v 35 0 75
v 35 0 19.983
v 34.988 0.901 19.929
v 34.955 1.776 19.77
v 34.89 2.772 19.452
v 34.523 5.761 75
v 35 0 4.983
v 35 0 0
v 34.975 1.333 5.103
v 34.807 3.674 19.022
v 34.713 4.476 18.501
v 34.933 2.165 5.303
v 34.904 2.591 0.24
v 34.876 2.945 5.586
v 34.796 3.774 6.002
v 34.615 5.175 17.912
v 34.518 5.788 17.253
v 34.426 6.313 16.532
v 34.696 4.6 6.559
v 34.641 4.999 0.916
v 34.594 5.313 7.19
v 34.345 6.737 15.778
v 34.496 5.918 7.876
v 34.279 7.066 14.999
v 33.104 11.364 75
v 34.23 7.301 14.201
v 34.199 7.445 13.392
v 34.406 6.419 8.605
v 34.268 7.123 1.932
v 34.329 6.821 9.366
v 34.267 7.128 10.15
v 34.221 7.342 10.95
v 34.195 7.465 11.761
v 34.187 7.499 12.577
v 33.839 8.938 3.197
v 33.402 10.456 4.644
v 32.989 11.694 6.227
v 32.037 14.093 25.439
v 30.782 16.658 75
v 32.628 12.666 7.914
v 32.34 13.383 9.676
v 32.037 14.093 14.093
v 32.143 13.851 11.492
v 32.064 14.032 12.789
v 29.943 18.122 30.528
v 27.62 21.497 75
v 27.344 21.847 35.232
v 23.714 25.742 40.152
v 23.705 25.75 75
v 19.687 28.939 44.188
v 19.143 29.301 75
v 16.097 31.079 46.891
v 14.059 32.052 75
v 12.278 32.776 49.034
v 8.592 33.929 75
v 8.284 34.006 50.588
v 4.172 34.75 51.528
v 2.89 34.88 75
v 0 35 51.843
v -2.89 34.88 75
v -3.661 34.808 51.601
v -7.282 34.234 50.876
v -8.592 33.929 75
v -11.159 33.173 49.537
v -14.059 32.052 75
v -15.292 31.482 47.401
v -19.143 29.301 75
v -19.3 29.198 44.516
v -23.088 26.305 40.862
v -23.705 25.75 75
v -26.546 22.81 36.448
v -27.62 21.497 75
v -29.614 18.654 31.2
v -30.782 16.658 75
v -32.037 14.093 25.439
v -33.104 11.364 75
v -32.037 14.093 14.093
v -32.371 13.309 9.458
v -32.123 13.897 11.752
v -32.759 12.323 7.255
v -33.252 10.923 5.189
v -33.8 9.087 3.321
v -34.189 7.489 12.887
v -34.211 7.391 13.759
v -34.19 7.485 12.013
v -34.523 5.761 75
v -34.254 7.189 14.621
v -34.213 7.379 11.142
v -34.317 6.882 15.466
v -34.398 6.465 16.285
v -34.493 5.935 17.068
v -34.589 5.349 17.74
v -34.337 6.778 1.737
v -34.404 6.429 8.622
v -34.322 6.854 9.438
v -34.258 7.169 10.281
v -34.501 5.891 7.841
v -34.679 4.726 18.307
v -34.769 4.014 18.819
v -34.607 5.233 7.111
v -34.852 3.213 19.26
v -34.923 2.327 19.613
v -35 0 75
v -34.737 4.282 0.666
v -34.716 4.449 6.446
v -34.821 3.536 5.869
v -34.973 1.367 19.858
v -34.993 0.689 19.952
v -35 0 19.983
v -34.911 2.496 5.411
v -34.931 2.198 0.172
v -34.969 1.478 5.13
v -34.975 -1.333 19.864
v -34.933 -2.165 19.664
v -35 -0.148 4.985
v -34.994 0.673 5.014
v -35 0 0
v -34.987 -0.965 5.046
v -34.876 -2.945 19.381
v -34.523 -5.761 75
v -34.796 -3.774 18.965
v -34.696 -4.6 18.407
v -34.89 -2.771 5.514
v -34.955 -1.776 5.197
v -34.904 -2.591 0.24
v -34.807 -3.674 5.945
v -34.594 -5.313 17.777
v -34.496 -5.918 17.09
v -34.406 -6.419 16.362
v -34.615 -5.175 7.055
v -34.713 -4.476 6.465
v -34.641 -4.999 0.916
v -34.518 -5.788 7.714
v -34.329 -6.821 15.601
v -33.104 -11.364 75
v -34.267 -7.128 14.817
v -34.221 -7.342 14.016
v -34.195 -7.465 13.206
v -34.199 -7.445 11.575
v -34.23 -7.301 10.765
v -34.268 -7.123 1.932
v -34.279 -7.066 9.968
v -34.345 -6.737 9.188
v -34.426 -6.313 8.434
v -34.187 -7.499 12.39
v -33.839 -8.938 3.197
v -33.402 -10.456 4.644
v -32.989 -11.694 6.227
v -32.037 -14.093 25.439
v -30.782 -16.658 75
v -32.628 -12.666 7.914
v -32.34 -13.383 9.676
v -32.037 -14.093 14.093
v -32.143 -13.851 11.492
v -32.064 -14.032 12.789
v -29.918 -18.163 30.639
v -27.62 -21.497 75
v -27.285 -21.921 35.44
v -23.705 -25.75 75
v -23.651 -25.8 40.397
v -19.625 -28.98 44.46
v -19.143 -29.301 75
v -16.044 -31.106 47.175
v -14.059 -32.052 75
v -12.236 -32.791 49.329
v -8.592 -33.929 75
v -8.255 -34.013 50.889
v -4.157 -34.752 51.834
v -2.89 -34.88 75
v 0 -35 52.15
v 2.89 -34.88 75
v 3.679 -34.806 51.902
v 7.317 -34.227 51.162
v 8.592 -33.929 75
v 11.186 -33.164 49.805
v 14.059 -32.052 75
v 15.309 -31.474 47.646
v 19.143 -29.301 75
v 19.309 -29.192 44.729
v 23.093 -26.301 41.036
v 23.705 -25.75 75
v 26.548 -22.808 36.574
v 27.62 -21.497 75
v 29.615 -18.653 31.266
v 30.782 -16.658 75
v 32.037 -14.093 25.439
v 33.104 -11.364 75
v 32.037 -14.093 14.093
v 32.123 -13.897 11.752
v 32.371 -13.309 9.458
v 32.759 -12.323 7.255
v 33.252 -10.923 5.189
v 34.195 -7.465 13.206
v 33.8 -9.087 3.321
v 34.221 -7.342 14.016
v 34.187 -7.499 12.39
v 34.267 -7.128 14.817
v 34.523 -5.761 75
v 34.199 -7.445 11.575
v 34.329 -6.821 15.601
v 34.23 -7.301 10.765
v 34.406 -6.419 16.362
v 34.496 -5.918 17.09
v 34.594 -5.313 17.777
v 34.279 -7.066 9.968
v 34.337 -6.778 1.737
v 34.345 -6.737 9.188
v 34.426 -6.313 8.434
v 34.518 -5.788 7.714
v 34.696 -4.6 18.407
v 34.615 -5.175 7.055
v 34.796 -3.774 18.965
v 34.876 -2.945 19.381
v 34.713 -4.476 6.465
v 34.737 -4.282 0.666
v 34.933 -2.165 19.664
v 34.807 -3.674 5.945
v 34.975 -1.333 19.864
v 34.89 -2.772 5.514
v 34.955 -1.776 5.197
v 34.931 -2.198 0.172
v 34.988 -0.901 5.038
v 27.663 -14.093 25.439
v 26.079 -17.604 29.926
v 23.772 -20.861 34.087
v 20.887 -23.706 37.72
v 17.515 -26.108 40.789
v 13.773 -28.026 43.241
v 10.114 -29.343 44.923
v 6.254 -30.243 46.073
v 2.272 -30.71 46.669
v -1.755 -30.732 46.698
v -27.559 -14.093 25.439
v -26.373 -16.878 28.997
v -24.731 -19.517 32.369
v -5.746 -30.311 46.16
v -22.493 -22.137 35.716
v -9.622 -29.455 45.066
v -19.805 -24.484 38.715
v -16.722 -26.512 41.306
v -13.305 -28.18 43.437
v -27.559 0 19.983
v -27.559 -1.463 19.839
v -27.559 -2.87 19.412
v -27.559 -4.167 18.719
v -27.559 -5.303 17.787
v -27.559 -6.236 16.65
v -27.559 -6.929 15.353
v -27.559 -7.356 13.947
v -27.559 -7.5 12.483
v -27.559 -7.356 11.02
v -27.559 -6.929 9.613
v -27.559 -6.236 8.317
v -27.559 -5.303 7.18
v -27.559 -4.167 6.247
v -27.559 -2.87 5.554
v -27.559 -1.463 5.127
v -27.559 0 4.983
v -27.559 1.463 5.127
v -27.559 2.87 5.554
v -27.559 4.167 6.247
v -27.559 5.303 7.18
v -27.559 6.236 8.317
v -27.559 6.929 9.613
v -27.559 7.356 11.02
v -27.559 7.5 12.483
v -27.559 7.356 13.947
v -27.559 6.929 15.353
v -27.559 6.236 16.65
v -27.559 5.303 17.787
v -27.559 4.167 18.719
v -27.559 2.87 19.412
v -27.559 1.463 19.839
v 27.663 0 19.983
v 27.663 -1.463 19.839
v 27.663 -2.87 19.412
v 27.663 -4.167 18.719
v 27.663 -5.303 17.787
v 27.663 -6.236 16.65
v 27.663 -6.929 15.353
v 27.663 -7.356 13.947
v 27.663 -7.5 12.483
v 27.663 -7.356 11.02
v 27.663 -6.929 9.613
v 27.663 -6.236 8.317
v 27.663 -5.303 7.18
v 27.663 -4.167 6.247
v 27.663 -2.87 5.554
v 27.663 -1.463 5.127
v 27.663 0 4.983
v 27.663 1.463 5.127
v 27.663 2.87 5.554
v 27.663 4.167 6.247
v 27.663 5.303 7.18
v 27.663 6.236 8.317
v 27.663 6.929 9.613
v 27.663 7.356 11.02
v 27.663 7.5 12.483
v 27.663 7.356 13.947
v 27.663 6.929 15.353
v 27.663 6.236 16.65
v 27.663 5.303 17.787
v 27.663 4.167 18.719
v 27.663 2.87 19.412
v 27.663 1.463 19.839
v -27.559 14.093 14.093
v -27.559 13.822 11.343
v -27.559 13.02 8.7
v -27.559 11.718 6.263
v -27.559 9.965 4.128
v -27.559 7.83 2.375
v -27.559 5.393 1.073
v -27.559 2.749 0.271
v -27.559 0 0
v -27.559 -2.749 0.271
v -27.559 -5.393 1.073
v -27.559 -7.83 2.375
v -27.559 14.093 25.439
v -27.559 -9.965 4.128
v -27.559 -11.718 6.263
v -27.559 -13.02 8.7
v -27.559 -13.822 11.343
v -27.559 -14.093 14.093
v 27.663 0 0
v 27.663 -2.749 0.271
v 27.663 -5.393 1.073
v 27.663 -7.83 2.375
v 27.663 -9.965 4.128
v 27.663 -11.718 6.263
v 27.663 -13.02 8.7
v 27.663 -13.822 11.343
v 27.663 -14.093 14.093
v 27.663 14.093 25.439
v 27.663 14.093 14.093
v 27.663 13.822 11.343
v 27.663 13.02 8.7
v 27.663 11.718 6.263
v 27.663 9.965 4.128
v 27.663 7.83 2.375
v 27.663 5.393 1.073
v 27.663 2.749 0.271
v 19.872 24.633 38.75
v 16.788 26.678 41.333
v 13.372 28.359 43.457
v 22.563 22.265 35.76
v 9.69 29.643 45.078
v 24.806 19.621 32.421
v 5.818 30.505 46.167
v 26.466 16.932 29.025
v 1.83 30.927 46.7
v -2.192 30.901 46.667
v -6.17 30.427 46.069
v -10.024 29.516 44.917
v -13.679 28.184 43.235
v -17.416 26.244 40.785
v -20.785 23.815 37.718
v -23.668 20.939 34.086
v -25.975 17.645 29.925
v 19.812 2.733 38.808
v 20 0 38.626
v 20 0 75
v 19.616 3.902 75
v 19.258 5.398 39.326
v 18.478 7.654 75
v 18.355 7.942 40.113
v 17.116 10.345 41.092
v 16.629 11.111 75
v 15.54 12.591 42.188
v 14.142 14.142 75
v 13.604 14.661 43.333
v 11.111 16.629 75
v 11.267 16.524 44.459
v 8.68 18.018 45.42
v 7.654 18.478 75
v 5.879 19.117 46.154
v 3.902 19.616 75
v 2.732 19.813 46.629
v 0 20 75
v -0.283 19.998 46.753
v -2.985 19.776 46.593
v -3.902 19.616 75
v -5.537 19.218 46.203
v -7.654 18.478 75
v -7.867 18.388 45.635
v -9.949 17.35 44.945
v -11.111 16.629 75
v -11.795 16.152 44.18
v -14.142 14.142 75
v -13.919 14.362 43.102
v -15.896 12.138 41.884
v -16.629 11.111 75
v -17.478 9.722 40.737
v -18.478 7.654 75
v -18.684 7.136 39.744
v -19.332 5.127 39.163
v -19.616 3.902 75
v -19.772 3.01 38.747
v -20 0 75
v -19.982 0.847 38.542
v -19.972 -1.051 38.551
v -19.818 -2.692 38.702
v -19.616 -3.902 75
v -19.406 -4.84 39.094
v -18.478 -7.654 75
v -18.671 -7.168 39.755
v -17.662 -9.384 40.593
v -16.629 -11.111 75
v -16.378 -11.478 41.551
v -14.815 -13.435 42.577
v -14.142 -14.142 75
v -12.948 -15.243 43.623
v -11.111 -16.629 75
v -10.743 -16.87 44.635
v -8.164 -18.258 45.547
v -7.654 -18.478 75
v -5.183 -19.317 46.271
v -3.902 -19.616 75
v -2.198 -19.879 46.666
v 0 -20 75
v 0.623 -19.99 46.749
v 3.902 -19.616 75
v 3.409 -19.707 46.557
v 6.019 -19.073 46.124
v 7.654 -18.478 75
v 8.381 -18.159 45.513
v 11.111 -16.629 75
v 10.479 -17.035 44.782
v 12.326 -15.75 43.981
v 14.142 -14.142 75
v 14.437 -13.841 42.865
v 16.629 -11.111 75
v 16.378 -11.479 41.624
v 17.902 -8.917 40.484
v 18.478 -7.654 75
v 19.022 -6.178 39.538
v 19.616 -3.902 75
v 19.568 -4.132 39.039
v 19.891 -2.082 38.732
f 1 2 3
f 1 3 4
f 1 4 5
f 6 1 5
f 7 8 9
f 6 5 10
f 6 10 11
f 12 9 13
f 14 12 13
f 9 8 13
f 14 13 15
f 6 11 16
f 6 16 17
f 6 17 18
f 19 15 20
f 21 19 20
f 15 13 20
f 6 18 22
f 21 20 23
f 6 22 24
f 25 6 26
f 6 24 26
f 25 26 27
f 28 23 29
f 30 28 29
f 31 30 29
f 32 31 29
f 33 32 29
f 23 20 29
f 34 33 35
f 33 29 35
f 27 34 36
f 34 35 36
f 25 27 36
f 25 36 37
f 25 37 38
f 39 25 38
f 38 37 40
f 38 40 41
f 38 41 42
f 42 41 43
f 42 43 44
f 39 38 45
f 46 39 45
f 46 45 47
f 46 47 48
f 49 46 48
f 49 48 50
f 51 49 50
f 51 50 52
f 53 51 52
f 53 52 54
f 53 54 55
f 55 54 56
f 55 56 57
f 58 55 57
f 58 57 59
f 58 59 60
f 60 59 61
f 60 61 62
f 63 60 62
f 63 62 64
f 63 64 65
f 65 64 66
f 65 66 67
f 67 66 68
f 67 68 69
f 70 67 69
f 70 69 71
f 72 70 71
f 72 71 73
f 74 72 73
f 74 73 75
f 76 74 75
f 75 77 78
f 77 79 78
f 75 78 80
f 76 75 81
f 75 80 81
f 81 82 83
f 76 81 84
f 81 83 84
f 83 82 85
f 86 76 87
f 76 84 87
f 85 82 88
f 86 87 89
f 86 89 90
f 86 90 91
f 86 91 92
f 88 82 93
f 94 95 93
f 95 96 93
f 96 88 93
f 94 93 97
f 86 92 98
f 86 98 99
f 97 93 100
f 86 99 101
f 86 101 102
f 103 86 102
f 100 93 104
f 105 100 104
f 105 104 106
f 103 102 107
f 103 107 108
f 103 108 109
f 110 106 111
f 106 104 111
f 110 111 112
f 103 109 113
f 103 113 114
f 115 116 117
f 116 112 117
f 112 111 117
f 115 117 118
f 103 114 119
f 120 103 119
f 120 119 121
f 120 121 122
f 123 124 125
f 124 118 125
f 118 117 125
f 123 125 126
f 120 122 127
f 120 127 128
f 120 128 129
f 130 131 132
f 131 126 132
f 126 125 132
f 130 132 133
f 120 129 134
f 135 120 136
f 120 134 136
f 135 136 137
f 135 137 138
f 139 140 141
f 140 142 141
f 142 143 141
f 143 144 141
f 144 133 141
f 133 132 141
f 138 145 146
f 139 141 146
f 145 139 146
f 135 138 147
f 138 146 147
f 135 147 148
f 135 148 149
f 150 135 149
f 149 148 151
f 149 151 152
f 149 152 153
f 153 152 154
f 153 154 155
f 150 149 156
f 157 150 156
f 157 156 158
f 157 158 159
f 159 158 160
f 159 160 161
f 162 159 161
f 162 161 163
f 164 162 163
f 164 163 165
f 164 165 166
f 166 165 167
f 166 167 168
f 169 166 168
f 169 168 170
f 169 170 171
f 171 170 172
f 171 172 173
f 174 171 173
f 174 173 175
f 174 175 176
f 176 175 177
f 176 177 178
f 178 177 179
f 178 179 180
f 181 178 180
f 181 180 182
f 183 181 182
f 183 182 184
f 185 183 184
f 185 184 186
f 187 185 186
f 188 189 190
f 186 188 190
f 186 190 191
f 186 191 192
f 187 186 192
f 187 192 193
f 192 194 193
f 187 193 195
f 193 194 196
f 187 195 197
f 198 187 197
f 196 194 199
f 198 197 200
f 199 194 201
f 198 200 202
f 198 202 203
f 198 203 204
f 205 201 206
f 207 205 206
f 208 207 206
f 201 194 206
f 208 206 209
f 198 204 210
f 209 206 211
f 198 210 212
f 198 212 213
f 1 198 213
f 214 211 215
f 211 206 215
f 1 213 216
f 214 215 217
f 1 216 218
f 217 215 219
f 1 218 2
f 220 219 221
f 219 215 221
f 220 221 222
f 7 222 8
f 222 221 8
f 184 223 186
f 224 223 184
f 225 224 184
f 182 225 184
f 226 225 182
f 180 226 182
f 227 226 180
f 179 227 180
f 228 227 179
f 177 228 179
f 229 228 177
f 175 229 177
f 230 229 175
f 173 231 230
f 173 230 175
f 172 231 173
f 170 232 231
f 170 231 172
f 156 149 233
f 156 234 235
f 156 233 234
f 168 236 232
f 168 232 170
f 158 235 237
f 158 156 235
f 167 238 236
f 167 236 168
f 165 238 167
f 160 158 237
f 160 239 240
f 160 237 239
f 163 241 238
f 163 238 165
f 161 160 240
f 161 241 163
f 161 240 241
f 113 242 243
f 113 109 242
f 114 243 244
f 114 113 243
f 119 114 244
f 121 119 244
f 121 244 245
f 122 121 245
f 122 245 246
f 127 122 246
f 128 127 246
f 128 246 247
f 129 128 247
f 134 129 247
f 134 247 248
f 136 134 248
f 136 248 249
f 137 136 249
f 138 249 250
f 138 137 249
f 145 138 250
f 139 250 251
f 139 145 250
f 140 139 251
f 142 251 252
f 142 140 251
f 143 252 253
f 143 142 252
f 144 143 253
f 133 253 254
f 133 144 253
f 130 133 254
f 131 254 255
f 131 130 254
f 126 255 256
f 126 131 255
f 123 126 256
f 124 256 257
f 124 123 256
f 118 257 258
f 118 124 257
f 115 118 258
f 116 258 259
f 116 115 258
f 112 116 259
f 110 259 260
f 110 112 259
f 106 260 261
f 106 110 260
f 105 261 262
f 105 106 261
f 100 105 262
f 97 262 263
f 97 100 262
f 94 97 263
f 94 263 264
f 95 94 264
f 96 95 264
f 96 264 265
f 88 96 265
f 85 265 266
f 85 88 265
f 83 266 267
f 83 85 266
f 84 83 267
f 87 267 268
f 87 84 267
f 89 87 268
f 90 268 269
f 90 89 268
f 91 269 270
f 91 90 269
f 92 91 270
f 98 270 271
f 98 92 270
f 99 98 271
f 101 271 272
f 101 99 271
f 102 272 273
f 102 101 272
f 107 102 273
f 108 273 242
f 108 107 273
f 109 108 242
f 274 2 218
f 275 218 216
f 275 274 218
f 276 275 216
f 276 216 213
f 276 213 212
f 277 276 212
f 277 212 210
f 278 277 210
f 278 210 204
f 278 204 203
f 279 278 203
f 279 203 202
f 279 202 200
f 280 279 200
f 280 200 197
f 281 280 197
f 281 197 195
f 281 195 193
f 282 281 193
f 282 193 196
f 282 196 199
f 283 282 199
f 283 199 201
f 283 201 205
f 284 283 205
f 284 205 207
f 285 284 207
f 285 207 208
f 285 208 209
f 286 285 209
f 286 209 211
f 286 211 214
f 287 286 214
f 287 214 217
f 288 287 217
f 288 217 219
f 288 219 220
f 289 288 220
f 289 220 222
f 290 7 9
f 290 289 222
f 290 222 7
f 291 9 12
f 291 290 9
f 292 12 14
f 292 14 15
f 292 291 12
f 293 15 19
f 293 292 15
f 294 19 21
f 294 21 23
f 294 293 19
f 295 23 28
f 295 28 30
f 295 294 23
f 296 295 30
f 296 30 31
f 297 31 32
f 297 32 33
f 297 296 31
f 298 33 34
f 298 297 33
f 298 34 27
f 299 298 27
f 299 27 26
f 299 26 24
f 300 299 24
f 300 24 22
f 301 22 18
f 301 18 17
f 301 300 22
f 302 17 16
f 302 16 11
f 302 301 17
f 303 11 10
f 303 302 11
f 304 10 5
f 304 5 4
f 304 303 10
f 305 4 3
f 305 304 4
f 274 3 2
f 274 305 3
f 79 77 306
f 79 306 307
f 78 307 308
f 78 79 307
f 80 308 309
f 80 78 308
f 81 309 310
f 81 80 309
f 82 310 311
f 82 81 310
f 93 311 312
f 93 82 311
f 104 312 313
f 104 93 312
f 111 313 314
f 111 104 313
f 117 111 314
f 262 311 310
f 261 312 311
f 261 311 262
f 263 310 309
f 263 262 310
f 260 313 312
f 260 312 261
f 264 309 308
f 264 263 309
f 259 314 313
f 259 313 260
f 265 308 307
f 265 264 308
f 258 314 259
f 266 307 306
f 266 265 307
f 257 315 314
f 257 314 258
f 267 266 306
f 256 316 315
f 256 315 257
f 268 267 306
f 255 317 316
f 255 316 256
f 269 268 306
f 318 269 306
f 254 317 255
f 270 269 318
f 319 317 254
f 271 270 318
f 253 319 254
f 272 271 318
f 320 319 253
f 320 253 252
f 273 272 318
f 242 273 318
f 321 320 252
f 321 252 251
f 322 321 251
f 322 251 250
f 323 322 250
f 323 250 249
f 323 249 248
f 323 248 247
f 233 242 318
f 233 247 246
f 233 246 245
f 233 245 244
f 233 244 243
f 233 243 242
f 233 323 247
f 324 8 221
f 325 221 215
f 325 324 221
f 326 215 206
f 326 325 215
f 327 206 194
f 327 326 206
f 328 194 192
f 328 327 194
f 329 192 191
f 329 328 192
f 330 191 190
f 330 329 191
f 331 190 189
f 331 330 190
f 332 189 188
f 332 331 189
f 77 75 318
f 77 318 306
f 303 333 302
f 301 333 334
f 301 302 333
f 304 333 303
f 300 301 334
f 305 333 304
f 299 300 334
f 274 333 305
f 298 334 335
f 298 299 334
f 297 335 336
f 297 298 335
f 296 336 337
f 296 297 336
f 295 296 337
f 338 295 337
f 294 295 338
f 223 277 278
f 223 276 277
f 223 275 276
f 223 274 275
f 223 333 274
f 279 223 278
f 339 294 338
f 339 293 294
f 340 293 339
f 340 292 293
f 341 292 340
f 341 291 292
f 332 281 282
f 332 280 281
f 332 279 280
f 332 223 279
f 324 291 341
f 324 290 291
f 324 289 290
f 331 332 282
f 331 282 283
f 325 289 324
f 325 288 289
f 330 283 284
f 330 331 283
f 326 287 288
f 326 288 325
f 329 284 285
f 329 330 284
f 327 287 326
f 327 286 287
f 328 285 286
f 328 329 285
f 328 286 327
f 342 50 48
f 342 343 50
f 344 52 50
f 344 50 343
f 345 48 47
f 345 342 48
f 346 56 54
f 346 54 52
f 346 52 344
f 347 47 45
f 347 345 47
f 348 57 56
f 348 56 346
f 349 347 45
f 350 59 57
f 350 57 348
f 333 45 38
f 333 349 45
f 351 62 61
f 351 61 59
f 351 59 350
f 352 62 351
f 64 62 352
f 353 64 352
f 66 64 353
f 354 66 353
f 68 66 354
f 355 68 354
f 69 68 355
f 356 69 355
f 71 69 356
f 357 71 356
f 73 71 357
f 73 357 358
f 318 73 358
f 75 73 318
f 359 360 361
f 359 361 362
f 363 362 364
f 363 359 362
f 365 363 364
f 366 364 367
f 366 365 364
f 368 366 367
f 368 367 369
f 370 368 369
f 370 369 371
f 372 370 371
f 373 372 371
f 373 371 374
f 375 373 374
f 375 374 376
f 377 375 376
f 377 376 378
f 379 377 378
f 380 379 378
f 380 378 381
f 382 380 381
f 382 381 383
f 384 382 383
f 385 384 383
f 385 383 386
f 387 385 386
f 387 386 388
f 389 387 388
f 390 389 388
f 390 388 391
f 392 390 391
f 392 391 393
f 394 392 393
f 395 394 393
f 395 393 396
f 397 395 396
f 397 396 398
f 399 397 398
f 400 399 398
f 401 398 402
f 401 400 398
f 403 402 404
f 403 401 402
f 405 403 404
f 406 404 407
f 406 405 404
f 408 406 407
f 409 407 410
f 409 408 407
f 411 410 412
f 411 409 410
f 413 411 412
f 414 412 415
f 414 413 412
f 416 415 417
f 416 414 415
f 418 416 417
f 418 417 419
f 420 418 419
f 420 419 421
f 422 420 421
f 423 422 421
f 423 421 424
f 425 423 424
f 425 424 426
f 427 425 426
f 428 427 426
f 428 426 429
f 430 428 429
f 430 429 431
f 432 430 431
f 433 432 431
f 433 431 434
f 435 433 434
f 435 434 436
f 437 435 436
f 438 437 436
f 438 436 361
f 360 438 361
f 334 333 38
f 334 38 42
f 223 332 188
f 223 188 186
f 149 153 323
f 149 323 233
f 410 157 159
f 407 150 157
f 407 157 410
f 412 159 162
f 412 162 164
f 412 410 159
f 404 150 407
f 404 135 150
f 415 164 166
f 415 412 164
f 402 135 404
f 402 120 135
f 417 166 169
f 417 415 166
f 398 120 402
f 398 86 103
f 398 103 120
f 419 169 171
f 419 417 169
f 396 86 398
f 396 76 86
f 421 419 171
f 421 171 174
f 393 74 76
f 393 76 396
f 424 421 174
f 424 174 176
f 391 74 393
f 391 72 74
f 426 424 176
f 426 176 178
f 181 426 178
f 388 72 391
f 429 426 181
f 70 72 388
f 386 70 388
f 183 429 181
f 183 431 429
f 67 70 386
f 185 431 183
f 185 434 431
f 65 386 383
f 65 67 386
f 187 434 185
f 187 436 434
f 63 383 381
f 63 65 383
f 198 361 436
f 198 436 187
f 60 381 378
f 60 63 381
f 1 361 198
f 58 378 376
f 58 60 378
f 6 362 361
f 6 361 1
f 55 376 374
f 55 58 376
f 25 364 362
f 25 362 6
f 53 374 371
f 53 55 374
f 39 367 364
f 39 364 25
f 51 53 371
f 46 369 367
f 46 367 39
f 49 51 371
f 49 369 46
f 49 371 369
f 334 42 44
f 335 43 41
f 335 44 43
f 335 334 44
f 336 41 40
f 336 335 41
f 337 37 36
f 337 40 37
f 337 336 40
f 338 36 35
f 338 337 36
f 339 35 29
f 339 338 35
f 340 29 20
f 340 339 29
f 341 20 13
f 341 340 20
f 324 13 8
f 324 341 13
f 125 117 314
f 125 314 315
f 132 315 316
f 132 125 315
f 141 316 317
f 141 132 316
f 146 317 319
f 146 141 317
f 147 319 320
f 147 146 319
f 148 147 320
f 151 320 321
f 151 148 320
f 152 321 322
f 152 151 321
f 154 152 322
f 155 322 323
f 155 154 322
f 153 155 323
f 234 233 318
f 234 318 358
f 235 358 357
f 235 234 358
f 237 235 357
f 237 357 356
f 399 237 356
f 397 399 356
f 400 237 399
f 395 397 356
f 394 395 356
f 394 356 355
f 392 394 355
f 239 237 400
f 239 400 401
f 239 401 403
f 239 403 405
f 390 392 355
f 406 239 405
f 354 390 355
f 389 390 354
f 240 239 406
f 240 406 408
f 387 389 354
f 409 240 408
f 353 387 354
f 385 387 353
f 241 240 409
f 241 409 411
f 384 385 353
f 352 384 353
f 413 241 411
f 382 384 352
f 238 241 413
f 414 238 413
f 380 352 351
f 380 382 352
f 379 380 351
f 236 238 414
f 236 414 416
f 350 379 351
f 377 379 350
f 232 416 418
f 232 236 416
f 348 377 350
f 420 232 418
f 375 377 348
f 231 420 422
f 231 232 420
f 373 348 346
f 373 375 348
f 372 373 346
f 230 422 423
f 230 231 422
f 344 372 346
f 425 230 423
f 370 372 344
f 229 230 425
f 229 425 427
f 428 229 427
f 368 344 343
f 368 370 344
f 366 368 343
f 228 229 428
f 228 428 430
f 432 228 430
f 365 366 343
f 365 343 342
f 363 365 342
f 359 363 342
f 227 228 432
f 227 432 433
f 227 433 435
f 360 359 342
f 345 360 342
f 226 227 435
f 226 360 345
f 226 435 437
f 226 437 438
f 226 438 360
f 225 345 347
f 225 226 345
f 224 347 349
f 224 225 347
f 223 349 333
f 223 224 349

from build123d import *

# Parameters (mm, degrees)
SKETCH1_R               = 35
SKETCH1_R_2             = 20
BOSS_EXTRUDE1_DEPTH     = 75
CUT_EXTRUDE1_DEPTH      = 45
CUT_EXTRUDE1_DEPTH_BACK = 54
CUT_EXTRUDE2_DEPTH      = 48
CUT_EXTRUDE2_DEPTH_BACK = 44
CUT_EXTRUDE3_DEPTH      = 44
CUT_EXTRUDE3_DEPTH_BACK = 44
SKETCH4_R               = 7.5


with BuildPart() as part:
    # Sketch1 → Boss-Extrude1 (new body)
    with BuildSketch(Plane.XY):
        Circle(SKETCH1_R)
        Circle(SKETCH1_R_2, mode=Mode.SUBTRACT)
    extrude(amount=BOSS_EXTRUDE1_DEPTH)

    # Sketch2 → Cut-Extrude1 (cut, two sides: drawn at the far end of the back side and taken through both)
    with BuildSketch(Plane(origin=(0, 0, 0), x_dir=(0, 0, -1), z_dir=(1, 0, 0)).offset(-CUT_EXTRUDE1_DEPTH_BACK)):
        with BuildLine():
            Line((0, -35), (0, 0))
            ThreePointArc((0, 0), (-4.127707746, -9.965168023), (-14.092875769, -14.092875769))
            Line((-14.092875769, -14.092875769), (-25.439318665, -14.092875769))
            Line((-25.439318665, -14.092875769), (-52.150222161, -35))
            Line((-52.150222161, -35), (0, -35))
        make_face()
        with BuildLine():
            Line((-25.439318665, 14.092875769), (-14.092875769, 14.092875769))
            ThreePointArc((-14.092875769, 14.092875769), (-4.127707746, 9.965168023), (0, 0))
            Line((0, 0), (0, 35))
            Line((0, 35), (-51.84345844, 35))
            Line((-51.84345844, 35), (-25.439318665, 14.092875769))
        make_face()
    extrude(amount=CUT_EXTRUDE1_DEPTH + CUT_EXTRUDE1_DEPTH_BACK, mode=Mode.SUBTRACT)

    # Sketch3 → Cut-Extrude2 (cut, two sides: drawn at the far end of the back side and taken through both)
    with BuildSketch(Plane(origin=(0, 0, 0), x_dir=(1, 0, 0), z_dir=(0, 1, 0)).offset(-CUT_EXTRUDE2_DEPTH_BACK)):
        with BuildLine():
            Line((-27.558791769, 0), (-27.558791769, -25.439318665))
            ThreePointArc((-27.558791769, -25.439318665), (0.052095226, -46.7551788), (27.662982221, -25.439318665))
            Line((27.662982221, -25.439318665), (27.662982221, 0))
            Line((27.662982221, 0), (-27.558791769, 0))
        make_face()
    extrude(amount=CUT_EXTRUDE2_DEPTH + CUT_EXTRUDE2_DEPTH_BACK, mode=Mode.SUBTRACT)

    # Sketch4 → Cut-Extrude3 (cut, two sides: drawn at the far end of the back side and taken through both)
    with BuildSketch(Plane(origin=(0, 0, 0), x_dir=(0, 0, -1), z_dir=(1, 0, 0)).offset(-CUT_EXTRUDE3_DEPTH_BACK)):
        with Locations(Location((-12.483344887, 0, 0), (0, 0, 180))):
            Circle(SKETCH4_R)
    extrude(amount=CUT_EXTRUDE3_DEPTH + CUT_EXTRUDE3_DEPTH_BACK, mode=Mode.SUBTRACT)


solid = part.part
